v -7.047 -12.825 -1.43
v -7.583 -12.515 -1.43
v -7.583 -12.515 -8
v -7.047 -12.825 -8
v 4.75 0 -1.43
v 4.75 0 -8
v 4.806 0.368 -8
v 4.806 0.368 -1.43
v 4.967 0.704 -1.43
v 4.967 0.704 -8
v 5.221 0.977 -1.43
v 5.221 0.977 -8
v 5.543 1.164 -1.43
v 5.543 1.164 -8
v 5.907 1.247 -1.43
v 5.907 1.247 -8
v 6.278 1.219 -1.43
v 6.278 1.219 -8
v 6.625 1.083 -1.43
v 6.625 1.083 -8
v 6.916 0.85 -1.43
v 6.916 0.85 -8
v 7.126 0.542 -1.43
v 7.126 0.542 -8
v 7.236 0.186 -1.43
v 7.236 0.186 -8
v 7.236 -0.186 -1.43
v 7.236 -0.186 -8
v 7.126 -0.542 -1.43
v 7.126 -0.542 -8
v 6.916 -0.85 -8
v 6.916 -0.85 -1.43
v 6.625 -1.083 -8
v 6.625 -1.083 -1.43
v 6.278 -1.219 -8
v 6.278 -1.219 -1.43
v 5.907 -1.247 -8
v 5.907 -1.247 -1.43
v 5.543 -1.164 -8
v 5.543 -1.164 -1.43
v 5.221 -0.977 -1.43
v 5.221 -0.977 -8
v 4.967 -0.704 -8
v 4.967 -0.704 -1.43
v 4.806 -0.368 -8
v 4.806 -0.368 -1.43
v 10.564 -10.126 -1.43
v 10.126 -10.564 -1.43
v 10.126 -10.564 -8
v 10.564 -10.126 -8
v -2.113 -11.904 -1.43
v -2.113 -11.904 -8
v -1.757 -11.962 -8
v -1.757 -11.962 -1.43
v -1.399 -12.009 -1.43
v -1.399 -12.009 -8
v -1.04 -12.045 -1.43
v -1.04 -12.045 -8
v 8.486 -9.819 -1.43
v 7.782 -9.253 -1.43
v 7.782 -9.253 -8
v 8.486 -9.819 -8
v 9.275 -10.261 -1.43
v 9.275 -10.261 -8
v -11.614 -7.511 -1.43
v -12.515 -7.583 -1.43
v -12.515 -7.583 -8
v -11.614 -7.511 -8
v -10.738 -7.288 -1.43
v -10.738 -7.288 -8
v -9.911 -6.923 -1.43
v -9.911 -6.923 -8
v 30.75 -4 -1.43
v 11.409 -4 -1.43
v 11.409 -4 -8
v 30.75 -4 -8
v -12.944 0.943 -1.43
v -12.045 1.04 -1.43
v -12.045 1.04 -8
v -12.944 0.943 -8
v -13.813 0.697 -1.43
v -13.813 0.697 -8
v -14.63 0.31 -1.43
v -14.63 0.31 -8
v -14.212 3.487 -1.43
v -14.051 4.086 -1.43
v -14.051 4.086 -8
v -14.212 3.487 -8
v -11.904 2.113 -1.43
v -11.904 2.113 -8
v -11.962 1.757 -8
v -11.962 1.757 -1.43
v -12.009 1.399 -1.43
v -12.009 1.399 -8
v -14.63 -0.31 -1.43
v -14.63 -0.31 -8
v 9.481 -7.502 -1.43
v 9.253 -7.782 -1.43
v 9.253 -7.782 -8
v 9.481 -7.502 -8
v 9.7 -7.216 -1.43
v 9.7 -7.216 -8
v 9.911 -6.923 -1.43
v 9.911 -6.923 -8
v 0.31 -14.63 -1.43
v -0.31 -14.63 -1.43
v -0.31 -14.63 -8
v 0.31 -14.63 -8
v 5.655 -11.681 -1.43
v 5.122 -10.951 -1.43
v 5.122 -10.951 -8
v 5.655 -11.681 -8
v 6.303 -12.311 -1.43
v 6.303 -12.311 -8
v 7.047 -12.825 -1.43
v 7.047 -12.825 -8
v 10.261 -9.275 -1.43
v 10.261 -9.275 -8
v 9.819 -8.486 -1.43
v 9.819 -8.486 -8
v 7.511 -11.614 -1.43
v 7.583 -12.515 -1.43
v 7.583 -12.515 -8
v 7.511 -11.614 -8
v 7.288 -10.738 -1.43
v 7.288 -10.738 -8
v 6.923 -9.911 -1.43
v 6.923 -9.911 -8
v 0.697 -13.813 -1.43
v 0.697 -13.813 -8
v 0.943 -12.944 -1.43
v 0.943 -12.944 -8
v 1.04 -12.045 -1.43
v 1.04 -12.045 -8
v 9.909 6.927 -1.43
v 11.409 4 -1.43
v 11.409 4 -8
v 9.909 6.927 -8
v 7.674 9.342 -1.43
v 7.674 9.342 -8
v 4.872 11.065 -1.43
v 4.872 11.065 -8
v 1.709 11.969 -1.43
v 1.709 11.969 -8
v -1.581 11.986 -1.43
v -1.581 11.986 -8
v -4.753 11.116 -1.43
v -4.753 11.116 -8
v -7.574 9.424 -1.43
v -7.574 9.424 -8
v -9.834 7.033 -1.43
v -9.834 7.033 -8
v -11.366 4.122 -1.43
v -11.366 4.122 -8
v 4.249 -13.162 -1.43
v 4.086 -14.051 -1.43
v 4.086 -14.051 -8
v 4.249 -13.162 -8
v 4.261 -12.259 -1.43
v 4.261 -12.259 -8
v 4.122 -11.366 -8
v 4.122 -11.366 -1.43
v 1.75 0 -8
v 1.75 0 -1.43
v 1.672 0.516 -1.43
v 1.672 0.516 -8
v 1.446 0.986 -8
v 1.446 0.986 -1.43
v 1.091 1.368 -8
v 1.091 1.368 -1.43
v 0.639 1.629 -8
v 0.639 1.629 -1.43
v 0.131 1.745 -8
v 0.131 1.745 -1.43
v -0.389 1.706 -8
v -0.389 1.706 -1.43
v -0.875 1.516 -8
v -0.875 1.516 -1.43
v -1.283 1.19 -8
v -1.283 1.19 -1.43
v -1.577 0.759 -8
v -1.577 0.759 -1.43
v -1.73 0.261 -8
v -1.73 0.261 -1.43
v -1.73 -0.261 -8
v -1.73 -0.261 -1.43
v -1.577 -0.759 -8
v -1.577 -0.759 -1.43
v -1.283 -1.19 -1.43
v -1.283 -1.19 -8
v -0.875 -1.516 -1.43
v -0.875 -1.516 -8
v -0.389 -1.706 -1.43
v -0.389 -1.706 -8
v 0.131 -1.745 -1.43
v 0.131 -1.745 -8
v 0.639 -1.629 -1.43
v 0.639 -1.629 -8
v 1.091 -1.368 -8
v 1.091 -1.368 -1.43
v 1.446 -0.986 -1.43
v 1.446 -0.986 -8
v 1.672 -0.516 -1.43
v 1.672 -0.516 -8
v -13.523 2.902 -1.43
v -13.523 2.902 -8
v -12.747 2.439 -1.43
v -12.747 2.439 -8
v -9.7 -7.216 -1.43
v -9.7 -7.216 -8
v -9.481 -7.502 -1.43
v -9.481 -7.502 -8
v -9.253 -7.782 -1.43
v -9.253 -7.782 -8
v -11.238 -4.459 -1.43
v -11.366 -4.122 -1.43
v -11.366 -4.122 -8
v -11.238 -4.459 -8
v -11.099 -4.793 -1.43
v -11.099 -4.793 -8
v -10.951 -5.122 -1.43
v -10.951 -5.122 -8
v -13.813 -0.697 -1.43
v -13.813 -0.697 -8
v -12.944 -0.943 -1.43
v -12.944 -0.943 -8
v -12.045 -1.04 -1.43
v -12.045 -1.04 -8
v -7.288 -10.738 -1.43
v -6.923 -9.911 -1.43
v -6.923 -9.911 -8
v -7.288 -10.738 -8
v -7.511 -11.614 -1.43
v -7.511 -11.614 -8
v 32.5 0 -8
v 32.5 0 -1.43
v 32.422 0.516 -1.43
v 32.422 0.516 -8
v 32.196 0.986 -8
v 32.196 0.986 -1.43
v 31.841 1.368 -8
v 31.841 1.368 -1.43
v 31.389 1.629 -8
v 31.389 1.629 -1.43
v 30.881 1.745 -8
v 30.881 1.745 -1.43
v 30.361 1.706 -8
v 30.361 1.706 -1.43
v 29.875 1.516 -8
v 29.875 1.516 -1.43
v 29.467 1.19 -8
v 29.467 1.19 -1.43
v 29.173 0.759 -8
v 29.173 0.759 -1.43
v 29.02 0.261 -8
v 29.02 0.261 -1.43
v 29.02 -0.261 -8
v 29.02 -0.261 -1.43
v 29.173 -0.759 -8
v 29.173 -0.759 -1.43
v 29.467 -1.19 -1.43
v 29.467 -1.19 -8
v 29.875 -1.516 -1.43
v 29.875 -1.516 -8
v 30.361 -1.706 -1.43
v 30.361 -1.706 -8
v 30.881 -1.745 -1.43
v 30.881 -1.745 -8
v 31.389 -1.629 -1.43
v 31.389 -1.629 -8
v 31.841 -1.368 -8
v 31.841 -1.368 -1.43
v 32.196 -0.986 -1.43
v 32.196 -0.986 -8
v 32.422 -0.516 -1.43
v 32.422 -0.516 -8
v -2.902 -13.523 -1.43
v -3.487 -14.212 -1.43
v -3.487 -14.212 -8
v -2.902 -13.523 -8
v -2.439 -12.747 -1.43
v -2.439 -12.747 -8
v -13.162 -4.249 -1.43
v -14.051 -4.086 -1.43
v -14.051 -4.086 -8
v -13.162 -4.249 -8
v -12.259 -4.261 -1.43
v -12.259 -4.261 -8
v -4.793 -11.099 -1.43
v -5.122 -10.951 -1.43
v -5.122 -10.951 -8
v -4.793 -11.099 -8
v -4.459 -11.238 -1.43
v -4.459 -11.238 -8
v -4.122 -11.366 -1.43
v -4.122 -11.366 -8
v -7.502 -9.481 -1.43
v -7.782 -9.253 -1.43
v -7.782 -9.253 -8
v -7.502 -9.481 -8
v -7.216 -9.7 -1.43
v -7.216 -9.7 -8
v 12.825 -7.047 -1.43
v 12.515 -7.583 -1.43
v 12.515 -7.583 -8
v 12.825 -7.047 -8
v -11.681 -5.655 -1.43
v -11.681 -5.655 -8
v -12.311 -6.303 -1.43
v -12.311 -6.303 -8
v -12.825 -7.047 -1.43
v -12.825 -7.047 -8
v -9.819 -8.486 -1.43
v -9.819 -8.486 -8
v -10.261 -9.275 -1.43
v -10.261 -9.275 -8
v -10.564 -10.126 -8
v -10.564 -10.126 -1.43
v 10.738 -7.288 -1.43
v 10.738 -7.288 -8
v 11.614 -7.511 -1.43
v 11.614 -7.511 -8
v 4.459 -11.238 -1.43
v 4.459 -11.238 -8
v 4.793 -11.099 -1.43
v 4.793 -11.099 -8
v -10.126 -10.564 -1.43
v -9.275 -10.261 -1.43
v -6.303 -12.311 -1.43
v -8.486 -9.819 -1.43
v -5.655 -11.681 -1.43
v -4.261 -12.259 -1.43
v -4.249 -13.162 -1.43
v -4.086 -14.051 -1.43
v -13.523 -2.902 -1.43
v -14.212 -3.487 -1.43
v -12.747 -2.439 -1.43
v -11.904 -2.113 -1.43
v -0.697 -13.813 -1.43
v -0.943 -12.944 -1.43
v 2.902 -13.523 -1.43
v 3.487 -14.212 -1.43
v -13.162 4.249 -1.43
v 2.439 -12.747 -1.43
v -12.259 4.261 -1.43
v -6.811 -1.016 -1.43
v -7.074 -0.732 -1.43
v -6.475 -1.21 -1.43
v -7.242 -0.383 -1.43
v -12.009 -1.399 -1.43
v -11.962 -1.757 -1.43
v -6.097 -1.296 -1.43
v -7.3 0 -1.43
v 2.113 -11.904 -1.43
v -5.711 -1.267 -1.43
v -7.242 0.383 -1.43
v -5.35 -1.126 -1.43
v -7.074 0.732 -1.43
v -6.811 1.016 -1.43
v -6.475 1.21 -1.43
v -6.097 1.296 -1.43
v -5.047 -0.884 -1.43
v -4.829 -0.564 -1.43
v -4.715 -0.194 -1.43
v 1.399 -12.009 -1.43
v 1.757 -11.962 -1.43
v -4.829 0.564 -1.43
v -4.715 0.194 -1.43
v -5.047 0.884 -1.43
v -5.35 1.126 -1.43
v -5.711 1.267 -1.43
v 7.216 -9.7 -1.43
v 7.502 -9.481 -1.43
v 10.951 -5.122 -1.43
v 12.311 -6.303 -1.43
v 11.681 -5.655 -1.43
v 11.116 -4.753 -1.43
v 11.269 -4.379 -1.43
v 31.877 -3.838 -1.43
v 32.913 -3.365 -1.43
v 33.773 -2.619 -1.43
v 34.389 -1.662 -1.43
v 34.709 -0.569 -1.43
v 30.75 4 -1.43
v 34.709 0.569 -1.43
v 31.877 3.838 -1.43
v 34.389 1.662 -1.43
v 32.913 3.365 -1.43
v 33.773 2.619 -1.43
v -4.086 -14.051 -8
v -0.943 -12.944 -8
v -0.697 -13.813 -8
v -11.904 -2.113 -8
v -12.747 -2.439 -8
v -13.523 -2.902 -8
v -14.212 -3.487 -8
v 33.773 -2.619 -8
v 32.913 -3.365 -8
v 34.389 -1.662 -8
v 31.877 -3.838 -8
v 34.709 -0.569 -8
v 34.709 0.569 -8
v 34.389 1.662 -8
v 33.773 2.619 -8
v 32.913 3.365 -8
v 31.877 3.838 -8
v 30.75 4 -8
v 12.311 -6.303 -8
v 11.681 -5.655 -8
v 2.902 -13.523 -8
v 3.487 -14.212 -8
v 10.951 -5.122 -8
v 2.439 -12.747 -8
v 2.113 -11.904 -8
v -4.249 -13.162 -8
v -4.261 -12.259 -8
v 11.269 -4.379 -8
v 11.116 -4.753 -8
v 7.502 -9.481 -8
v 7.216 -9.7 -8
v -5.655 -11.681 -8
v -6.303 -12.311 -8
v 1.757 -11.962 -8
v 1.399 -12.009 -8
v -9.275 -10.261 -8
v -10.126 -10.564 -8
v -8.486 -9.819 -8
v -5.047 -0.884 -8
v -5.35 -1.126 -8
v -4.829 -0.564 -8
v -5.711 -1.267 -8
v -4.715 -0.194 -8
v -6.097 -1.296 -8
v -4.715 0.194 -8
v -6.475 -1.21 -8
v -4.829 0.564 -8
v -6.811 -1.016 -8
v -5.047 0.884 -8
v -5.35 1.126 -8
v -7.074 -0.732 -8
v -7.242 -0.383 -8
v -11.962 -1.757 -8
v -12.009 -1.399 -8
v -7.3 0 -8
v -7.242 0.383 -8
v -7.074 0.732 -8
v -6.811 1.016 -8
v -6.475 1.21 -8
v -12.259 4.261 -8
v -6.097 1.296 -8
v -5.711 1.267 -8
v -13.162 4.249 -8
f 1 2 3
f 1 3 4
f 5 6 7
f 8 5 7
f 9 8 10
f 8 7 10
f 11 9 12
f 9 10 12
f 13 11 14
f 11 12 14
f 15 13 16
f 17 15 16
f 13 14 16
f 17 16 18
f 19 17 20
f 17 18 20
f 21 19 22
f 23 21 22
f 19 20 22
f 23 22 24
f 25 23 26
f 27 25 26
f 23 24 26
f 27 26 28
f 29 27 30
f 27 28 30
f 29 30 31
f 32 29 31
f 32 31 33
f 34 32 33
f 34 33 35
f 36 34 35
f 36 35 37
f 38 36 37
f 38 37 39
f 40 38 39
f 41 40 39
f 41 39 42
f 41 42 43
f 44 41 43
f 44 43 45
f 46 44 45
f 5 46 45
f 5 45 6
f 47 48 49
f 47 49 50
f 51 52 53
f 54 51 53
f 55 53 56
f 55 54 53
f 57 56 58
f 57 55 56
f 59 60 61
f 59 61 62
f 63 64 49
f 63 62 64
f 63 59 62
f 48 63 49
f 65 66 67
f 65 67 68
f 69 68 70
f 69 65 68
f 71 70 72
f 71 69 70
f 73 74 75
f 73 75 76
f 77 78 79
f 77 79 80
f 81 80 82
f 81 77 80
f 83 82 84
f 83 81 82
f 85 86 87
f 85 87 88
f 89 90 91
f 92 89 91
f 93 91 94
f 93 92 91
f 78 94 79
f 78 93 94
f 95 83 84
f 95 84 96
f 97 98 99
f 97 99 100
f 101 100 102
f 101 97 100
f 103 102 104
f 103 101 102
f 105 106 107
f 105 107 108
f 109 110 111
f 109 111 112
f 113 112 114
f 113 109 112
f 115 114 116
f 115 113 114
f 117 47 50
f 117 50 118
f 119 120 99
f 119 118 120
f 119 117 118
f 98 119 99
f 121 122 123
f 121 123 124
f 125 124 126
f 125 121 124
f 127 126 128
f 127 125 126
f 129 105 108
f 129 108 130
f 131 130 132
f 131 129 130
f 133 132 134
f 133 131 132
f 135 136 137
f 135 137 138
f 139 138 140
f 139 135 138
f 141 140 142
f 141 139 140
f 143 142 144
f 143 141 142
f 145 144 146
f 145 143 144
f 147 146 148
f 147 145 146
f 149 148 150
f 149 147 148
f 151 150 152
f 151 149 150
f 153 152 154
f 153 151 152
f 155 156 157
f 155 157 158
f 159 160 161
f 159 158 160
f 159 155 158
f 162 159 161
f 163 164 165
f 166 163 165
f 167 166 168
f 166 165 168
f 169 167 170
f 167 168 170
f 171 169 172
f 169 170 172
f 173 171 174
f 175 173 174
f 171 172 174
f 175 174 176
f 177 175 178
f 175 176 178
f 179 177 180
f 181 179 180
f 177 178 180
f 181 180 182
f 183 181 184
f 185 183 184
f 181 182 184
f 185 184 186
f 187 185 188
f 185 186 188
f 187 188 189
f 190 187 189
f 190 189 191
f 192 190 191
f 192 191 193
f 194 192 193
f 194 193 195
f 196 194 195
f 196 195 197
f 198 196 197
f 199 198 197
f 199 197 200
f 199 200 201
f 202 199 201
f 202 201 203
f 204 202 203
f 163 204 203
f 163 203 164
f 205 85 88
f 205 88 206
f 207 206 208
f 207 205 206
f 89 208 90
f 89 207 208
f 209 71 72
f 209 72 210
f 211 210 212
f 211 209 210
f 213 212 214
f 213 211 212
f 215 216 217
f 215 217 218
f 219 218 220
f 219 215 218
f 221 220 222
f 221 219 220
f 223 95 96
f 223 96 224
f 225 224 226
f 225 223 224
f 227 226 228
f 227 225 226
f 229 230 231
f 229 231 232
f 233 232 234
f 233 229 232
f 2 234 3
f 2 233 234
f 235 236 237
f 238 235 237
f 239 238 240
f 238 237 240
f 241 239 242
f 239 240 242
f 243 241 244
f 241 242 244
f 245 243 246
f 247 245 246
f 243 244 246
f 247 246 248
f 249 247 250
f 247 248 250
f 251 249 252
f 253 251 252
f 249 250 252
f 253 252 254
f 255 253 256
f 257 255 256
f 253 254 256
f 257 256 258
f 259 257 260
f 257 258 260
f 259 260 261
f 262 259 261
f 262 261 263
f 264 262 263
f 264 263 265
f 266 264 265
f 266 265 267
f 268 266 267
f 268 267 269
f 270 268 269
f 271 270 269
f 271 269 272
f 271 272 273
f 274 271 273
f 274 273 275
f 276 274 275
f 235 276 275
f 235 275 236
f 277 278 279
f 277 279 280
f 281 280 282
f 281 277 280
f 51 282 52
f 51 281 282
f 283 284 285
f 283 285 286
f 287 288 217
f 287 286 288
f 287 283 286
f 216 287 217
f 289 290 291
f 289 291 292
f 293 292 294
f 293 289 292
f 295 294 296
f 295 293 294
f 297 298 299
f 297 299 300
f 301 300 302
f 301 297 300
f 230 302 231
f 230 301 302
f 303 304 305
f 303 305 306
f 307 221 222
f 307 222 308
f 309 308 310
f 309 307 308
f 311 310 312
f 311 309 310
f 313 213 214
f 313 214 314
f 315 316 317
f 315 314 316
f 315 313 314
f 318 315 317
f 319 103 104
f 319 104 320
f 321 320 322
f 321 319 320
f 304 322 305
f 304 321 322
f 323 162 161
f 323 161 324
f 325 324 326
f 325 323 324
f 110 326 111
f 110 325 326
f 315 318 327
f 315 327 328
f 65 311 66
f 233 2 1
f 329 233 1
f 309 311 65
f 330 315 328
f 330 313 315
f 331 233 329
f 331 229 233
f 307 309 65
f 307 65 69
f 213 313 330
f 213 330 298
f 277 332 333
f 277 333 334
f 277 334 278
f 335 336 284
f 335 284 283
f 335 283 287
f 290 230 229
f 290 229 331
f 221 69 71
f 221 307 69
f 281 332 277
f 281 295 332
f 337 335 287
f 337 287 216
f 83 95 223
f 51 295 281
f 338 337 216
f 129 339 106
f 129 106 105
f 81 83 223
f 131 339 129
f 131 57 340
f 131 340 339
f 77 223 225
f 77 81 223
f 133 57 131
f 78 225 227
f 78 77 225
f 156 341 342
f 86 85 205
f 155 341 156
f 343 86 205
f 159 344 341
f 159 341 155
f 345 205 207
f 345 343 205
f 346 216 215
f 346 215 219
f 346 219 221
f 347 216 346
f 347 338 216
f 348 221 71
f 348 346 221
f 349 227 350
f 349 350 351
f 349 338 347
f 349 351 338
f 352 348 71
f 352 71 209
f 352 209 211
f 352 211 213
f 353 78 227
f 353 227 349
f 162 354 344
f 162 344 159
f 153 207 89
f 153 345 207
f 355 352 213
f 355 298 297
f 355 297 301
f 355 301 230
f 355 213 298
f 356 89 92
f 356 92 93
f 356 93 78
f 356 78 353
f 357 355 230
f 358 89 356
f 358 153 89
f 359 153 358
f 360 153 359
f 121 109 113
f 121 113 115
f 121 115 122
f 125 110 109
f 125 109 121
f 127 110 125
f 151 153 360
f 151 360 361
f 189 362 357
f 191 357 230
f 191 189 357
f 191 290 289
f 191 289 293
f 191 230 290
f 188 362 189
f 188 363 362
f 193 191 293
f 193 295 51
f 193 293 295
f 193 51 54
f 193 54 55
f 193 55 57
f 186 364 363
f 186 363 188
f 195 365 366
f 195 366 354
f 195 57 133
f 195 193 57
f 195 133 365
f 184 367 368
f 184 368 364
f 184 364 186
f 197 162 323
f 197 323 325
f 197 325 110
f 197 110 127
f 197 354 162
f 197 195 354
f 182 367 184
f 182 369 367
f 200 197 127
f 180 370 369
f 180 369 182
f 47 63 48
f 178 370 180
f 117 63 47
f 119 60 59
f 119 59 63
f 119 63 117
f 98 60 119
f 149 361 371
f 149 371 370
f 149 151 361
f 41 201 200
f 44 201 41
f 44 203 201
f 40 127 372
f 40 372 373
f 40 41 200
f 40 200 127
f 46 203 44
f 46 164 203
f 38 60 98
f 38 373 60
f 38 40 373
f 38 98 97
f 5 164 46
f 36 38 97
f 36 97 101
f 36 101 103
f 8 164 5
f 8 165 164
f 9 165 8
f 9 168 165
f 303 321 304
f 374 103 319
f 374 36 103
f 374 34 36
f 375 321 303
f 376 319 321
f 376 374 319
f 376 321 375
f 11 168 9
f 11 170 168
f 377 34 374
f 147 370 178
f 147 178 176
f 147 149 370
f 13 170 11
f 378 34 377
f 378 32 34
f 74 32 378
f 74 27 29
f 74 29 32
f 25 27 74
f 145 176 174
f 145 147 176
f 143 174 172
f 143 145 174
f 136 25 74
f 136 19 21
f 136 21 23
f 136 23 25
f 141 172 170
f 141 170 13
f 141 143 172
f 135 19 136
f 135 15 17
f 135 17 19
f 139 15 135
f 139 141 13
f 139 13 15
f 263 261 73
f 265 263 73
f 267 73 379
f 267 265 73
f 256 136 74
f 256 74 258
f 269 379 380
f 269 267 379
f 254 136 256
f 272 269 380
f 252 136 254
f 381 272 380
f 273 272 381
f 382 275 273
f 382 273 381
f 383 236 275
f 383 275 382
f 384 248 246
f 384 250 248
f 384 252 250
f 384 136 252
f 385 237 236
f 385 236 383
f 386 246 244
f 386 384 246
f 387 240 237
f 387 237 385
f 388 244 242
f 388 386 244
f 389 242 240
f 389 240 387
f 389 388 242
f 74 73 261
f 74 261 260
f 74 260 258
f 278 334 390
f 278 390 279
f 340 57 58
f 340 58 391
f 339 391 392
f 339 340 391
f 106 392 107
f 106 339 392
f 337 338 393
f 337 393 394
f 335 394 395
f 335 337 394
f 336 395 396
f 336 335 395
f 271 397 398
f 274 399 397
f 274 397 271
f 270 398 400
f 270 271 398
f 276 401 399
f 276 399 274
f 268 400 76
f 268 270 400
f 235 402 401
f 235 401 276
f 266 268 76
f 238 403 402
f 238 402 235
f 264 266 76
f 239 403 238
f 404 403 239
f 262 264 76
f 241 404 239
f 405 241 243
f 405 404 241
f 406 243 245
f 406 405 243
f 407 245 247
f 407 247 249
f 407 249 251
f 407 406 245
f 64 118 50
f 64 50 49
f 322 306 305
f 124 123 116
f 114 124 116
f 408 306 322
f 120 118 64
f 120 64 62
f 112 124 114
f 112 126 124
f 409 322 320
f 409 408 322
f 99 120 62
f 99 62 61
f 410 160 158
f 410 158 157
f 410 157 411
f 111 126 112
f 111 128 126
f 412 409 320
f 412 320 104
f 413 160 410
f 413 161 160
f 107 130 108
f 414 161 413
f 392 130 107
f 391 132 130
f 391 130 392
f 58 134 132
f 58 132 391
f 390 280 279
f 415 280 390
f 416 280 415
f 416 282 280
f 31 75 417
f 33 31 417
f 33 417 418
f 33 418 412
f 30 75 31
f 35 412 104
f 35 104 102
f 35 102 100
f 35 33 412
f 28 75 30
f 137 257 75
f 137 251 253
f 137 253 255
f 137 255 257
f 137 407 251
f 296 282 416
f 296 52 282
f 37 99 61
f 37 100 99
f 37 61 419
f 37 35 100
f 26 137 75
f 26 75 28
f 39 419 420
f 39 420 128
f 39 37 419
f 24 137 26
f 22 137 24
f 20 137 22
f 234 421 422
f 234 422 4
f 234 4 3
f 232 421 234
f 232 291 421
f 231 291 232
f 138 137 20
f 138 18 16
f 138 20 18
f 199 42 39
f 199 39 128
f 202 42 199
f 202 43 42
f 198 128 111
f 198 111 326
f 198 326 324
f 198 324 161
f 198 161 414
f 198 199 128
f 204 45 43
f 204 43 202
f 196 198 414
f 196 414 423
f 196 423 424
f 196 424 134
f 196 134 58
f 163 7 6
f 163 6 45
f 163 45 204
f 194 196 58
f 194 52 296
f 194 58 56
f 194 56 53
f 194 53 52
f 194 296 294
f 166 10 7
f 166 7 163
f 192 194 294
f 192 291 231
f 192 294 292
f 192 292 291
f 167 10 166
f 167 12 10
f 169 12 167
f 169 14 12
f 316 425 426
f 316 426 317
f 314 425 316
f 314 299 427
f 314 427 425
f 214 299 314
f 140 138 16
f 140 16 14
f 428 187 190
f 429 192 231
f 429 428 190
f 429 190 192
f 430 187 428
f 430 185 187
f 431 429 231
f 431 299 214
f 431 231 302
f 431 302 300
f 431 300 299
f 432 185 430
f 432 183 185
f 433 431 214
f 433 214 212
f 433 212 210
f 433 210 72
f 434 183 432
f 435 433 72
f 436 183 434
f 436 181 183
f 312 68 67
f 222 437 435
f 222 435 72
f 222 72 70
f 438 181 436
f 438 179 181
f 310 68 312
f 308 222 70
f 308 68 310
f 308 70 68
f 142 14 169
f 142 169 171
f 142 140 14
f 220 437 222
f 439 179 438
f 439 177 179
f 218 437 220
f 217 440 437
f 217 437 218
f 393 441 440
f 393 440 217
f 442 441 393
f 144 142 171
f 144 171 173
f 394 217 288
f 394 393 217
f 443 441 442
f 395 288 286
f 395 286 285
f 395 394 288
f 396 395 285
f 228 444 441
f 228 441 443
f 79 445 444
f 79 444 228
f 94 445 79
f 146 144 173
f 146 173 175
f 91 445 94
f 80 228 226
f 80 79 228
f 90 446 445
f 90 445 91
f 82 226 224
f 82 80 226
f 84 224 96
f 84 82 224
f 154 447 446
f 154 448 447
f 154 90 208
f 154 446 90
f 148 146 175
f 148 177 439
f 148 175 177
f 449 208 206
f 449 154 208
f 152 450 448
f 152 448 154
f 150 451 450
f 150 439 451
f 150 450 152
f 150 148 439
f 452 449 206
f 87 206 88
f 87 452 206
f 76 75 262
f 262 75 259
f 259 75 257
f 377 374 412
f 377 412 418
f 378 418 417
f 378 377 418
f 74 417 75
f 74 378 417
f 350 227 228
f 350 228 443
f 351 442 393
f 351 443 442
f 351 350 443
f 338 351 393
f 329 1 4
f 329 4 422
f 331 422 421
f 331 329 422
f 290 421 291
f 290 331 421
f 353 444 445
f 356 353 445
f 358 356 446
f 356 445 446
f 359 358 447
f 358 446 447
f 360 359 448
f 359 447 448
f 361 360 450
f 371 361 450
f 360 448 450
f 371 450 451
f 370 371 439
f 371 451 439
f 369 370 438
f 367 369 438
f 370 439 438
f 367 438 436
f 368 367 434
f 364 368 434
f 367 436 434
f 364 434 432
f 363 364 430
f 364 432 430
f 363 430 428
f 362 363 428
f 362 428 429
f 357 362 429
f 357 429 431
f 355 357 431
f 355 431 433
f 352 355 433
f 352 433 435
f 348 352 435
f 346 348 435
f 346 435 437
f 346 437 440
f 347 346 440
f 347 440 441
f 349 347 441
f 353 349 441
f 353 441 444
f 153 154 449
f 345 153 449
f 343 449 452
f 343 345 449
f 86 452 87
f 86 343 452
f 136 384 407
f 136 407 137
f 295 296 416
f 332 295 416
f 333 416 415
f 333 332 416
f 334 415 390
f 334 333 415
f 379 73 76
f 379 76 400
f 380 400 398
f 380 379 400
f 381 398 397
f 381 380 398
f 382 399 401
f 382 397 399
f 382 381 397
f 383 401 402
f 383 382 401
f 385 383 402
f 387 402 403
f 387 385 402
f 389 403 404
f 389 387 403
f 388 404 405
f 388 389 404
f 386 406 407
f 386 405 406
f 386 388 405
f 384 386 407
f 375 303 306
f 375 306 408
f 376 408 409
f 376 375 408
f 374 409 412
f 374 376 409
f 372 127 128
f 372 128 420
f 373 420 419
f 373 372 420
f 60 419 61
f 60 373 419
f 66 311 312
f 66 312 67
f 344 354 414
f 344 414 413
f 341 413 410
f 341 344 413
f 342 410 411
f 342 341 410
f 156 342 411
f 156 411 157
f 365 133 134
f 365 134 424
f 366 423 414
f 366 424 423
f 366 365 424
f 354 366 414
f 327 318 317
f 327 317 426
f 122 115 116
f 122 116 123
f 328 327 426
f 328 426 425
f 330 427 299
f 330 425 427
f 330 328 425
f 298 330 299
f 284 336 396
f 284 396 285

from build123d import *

# Parameters (mm, degrees)
SKETCH2_R           = 1.75
BOSS_EXTRUDE1_DEPTH = 12
SKETCH10_R          = 1.3
SKETCH10_R_2        = 1.25
CUT_EXTRUDE1_DEPTH  = 40.567655983
CUT_EXTRUDE2_START  = -4
CUT_EXTRUDE2_DEPTH  = 4
CUT_EXTRUDE3_DEPTH  = 0.57
CUT_EXTRUDE4_DEPTH  = 0.86


with BuildPart() as part:
    # Sketch2 → Boss-Extrude1 (new body)
    with BuildSketch(Plane.XY):
        with BuildLine():
            ThreePointArc((-11.365584201, 4.122086336), (-12.71070456, 4.273667417), (-14.051260935, 4.085959636))
            Line((-14.051260935, 4.085959636), (-14.211728743, 3.487085624))
            ThreePointArc((-14.211728743, 3.487085624), (-13.144626757, 2.65424773), (-11.903927815, 2.112960617))
            ThreePointArc((-11.903927815, 2.112960617), (-11.986568374, 1.578061664), (-12.04518576, 1.04))
            ThreePointArc((-12.04518576, 1.04), (-13.383704325, 0.838273314), (-14.63, 0.31))
            Line((-14.63, 0.31), (-14.63, -0.31))
            ThreePointArc((-14.63, -0.31), (-13.383704325, -0.838273314), (-12.04518576, -1.04))
            ThreePointArc((-12.04518576, -1.04), (-11.986568374, -1.578061664), (-11.903927815, -2.112960617))
            ThreePointArc((-11.903927815, -2.112960617), (-13.144626757, -2.65424773), (-14.211728743, -3.487085624))
            Line((-14.211728743, -3.487085624), (-14.051260935, -4.085959636))
            ThreePointArc((-14.051260935, -4.085959636), (-12.71070456, -4.273667417), (-11.365584201, -4.122086336))
            ThreePointArc((-11.365584201, -4.122086336), (-11.169703548, -4.626642697), (-10.951436862, -5.12192646))
            ThreePointArc((-10.951436862, -5.12192646), (-12.009764599, -5.965886177), (-12.824951657, -7.046532125))
            Line((-12.824951657, -7.046532125), (-12.514951657, -7.583467875))
            ThreePointArc((-12.514951657, -7.583467875), (-11.171491285, -7.417818147), (-9.911436862, -6.9232593))
            ThreePointArc((-9.911436862, -6.9232593), (-9.591641884, -7.359925677), (-9.252623584, -7.781841479))
            ThreePointArc((-9.252623584, -7.781841479), (-10.05645683, -8.870959341), (-10.564175311, -10.125769107))
            Line((-10.564175311, -10.125769107), (-10.125769107, -10.564175311))
            ThreePointArc((-10.125769107, -10.564175311), (-8.870959341, -10.05645683), (-7.781841479, -9.252623584))
            ThreePointArc((-7.781841479, -9.252623584), (-7.359925677, -9.591641884), (-6.9232593, -9.911436862))
            ThreePointArc((-6.9232593, -9.911436862), (-7.417818147, -11.171491285), (-7.583467875, -12.514951657))
            Line((-7.583467875, -12.514951657), (-7.046532125, -12.824951657))
            ThreePointArc((-7.046532125, -12.824951657), (-5.965886177, -12.009764599), (-5.12192646, -10.951436862))
            ThreePointArc((-5.12192646, -10.951436862), (-4.626642697, -11.169703548), (-4.122086336, -11.365584201))
            ThreePointArc((-4.122086336, -11.365584201), (-4.273667417, -12.71070456), (-4.085959636, -14.051260935))
            Line((-4.085959636, -14.051260935), (-3.487085624, -14.211728743))
            ThreePointArc((-3.487085624, -14.211728743), (-2.65424773, -13.144626757), (-2.112960617, -11.903927815))
            ThreePointArc((-2.112960617, -11.903927815), (-1.578061664, -11.986568374), (-1.04, -12.04518576))
            ThreePointArc((-1.04, -12.04518576), (-0.838273314, -13.383704325), (-0.31, -14.63))
            Line((-0.31, -14.63), (0.31, -14.63))
            ThreePointArc((0.31, -14.63), (0.838273314, -13.383704325), (1.04, -12.04518576))
            ThreePointArc((1.04, -12.04518576), (1.578061664, -11.986568374), (2.112960617, -11.903927815))
            ThreePointArc((2.112960617, -11.903927815), (2.65424773, -13.144626757), (3.487085624, -14.211728743))
            Line((3.487085624, -14.211728743), (4.085959636, -14.051260935))
            ThreePointArc((4.085959636, -14.051260935), (4.273667417, -12.71070456), (4.122086336, -11.365584201))
            ThreePointArc((4.122086336, -11.365584201), (4.626642697, -11.169703548), (5.12192646, -10.951436862))
            ThreePointArc((5.12192646, -10.951436862), (5.965886177, -12.009764599), (7.046532125, -12.824951657))
            Line((7.046532125, -12.824951657), (7.583467875, -12.514951657))
            ThreePointArc((7.583467875, -12.514951657), (7.417818147, -11.171491285), (6.9232593, -9.911436862))
            ThreePointArc((6.9232593, -9.911436862), (7.359925677, -9.591641884), (7.781841479, -9.252623584))
            ThreePointArc((7.781841479, -9.252623584), (8.870959341, -10.05645683), (10.125769107, -10.564175311))
            Line((10.125769107, -10.564175311), (10.564175311, -10.125769107))
            ThreePointArc((10.564175311, -10.125769107), (10.05645683, -8.870959341), (9.252623584, -7.781841479))
            ThreePointArc((9.252623584, -7.781841479), (9.591641884, -7.359925677), (9.911436862, -6.9232593))
            ThreePointArc((9.911436862, -6.9232593), (11.171491285, -7.417818147), (12.514951657, -7.583467875))
            Line((12.514951657, -7.583467875), (12.824951657, -7.046532125))
            ThreePointArc((12.824951657, -7.046532125), (12.009764599, -5.965886177), (10.951436862, -5.12192646))
            ThreePointArc((10.951436862, -5.12192646), (11.194344337, -4.566700654), (11.409123542, -4))
            Line((11.409123542, -4), (30.75, -4))
            ThreePointArc((30.75, -4), (34.75, 0), (30.75, 4))
            Line((30.75, 4), (11.409123542, 4))
            ThreePointArc((11.409123542, 4), (0.064808849, 12.089826294), (-11.365584201, 4.122086336))
        make_face()
        Circle(SKETCH2_R, mode=Mode.SUBTRACT)
        with Locations((30.75, 0)):
            Circle(SKETCH2_R, mode=Mode.SUBTRACT)
    extrude(amount=-BOSS_EXTRUDE1_DEPTH)

    # Sketch10 → Cut-Extrude1 (cut, through all)
    with BuildSketch(Plane(origin=(0, 0, -12), x_dir=(-1, 0, 0), z_dir=(0, 0, -1))):
        with Locations((6, 0)):
            Circle(SKETCH10_R)
        with Locations((-6, 0)):
            Circle(SKETCH10_R_2)
    extrude(amount=-CUT_EXTRUDE1_DEPTH, mode=Mode.SUBTRACT)

    # Sketch11 → Cut-Extrude2 (cut)
    with BuildSketch(Plane(origin=(0, 0, -12), x_dir=(-1, 0, 0), z_dir=(0, 0, -1)).offset(CUT_EXTRUDE2_START)):
        with BuildLine():
            Line((-11.409123542, 4), (-30.75, 4))
            ThreePointArc((-30.75, 4), (-34.75, 0), (-30.75, -4))
            Line((-30.75, -4), (-11.409123542, -4))
            ThreePointArc((-11.409123542, -4), (-11.194344337, -4.566700654), (-10.951436862, -5.12192646))
            ThreePointArc((-10.951436862, -5.12192646), (-12.009764599, -5.965886177), (-12.824951657, -7.046532125))
            Line((-12.824951657, -7.046532125), (-12.514951657, -7.583467875))
            ThreePointArc((-12.514951657, -7.583467875), (-11.171491285, -7.417818147), (-9.911436862, -6.9232593))
            ThreePointArc((-9.911436862, -6.9232593), (-9.591641884, -7.359925677), (-9.252623584, -7.781841479))
            ThreePointArc((-9.252623584, -7.781841479), (-10.05645683, -8.870959341), (-10.564175311, -10.125769107))
            Line((-10.564175311, -10.125769107), (-10.125769107, -10.564175311))
            ThreePointArc((-10.125769107, -10.564175311), (-8.870959341, -10.05645683), (-7.781841479, -9.252623584))
            ThreePointArc((-7.781841479, -9.252623584), (-7.359925677, -9.591641884), (-6.9232593, -9.911436862))
            ThreePointArc((-6.9232593, -9.911436862), (-7.417818147, -11.171491285), (-7.583467875, -12.514951657))
            Line((-7.583467875, -12.514951657), (-7.046532125, -12.824951657))
            ThreePointArc((-7.046532125, -12.824951657), (-5.965886177, -12.009764599), (-5.12192646, -10.951436862))
            ThreePointArc((-5.12192646, -10.951436862), (-4.626642697, -11.169703548), (-4.122086336, -11.365584201))
            ThreePointArc((-4.122086336, -11.365584201), (-4.273667417, -12.71070456), (-4.085959636, -14.051260935))
            Line((-4.085959636, -14.051260935), (-3.487085624, -14.211728743))
            ThreePointArc((-3.487085624, -14.211728743), (-2.65424773, -13.144626757), (-2.112960617, -11.903927815))
            ThreePointArc((-2.112960617, -11.903927815), (-1.578061664, -11.986568374), (-1.04, -12.04518576))
            ThreePointArc((-1.04, -12.04518576), (-0.838273314, -13.383704325), (-0.31, -14.63))
            Line((-0.31, -14.63), (0.31, -14.63))
            ThreePointArc((0.31, -14.63), (0.838273314, -13.383704325), (1.04, -12.04518576))
            ThreePointArc((1.04, -12.04518576), (1.578061664, -11.986568374), (2.112960617, -11.903927815))
            ThreePointArc((2.112960617, -11.903927815), (2.65424773, -13.144626757), (3.487085624, -14.211728743))
            Line((3.487085624, -14.211728743), (4.085959636, -14.051260935))
            ThreePointArc((4.085959636, -14.051260935), (4.273667417, -12.71070456), (4.122086336, -11.365584201))
            ThreePointArc((4.122086336, -11.365584201), (4.626642697, -11.169703548), (5.12192646, -10.951436862))
            ThreePointArc((5.12192646, -10.951436862), (5.965886177, -12.009764599), (7.046532125, -12.824951657))
            Line((7.046532125, -12.824951657), (7.583467875, -12.514951657))
            ThreePointArc((7.583467875, -12.514951657), (7.417818147, -11.171491285), (6.9232593, -9.911436862))
            ThreePointArc((6.9232593, -9.911436862), (7.359925677, -9.591641884), (7.781841479, -9.252623584))
            ThreePointArc((7.781841479, -9.252623584), (8.870959341, -10.05645683), (10.125769107, -10.564175311))
            Line((10.125769107, -10.564175311), (10.564175311, -10.125769107))
            ThreePointArc((10.564175311, -10.125769107), (10.05645683, -8.870959341), (9.252623584, -7.781841479))
            ThreePointArc((9.252623584, -7.781841479), (9.591641884, -7.359925677), (9.911436862, -6.9232593))
            ThreePointArc((9.911436862, -6.9232593), (11.171491285, -7.417818147), (12.514951657, -7.583467875))
            Line((12.514951657, -7.583467875), (12.824951657, -7.046532125))
            ThreePointArc((12.824951657, -7.046532125), (12.009764599, -5.965886177), (10.951436862, -5.12192646))
            ThreePointArc((10.951436862, -5.12192646), (11.169703548, -4.626642697), (11.365584201, -4.122086336))
            ThreePointArc((11.365584201, -4.122086336), (12.71070456, -4.273667417), (14.051260935, -4.085959636))
            Line((14.051260935, -4.085959636), (14.211728743, -3.487085624))
            ThreePointArc((14.211728743, -3.487085624), (13.144626757, -2.65424773), (11.903927815, -2.112960617))
            ThreePointArc((11.903927815, -2.112960617), (11.986568374, -1.578061664), (12.04518576, -1.04))
            ThreePointArc((12.04518576, -1.04), (13.383704325, -0.838273314), (14.63, -0.31))
            Line((14.63, -0.31), (14.63, 0.31))
            ThreePointArc((14.63, 0.31), (13.383704325, 0.838273314), (12.04518576, 1.04))
            ThreePointArc((12.04518576, 1.04), (11.986568374, 1.578061664), (11.903927815, 2.112960617))
            ThreePointArc((11.903927815, 2.112960617), (13.144626757, 2.65424773), (14.211728743, 3.487085624))
            Line((14.211728743, 3.487085624), (14.051260935, 4.085959636))
            ThreePointArc((14.051260935, 4.085959636), (12.71070456, 4.273667417), (11.365584201, 4.122086336))
            ThreePointArc((11.365584201, 4.122086336), (-0.064808849, 12.089826294), (-11.409123542, 4))
        make_face()
    extrude(amount=CUT_EXTRUDE2_DEPTH, mode=Mode.SUBTRACT)

    # Sketch12 → Cut-Extrude3 (cut)
    with BuildSketch(Plane.XY):
        with BuildLine():
            Line((30.75, 4), (11.409123542, 4))
            ThreePointArc((11.409123542, 4), (0.064808849, 12.089826294), (-11.365584201, 4.122086336))
            ThreePointArc((-11.365584201, 4.122086336), (-12.71070456, 4.273667417), (-14.051260935, 4.085959636))
            Line((-14.051260935, 4.085959636), (-14.211728743, 3.487085624))
            ThreePointArc((-14.211728743, 3.487085624), (-13.144626757, 2.65424773), (-11.903927815, 2.112960617))
            ThreePointArc((-11.903927815, 2.112960617), (-11.986568374, 1.578061664), (-12.04518576, 1.04))
            ThreePointArc((-12.04518576, 1.04), (-13.383704325, 0.838273314), (-14.63, 0.31))
            Line((-14.63, 0.31), (-14.63, -0.31))
            ThreePointArc((-14.63, -0.31), (-13.383704325, -0.838273314), (-12.04518576, -1.04))
            ThreePointArc((-12.04518576, -1.04), (-11.986568374, -1.578061664), (-11.903927815, -2.112960617))
            ThreePointArc((-11.903927815, -2.112960617), (-13.144626757, -2.65424773), (-14.211728743, -3.487085624))
            Line((-14.211728743, -3.487085624), (-14.051260935, -4.085959636))
            ThreePointArc((-14.051260935, -4.085959636), (-12.71070456, -4.273667417), (-11.365584201, -4.122086336))
            ThreePointArc((-11.365584201, -4.122086336), (-11.169703548, -4.626642697), (-10.951436862, -5.12192646))
            ThreePointArc((-10.951436862, -5.12192646), (-12.009764599, -5.965886177), (-12.824951657, -7.046532125))
            Line((-12.824951657, -7.046532125), (-12.514951657, -7.583467875))
            ThreePointArc((-12.514951657, -7.583467875), (-11.171491285, -7.417818147), (-9.911436862, -6.9232593))
            ThreePointArc((-9.911436862, -6.9232593), (-9.591641884, -7.359925677), (-9.252623584, -7.781841479))
            ThreePointArc((-9.252623584, -7.781841479), (-10.05645683, -8.870959341), (-10.564175311, -10.125769107))
            Line((-10.564175311, -10.125769107), (-10.125769107, -10.564175311))
            ThreePointArc((-10.125769107, -10.564175311), (-8.870959341, -10.05645683), (-7.781841479, -9.252623584))
            ThreePointArc((-7.781841479, -9.252623584), (-7.359925677, -9.591641884), (-6.9232593, -9.911436862))
            ThreePointArc((-6.9232593, -9.911436862), (-7.417818147, -11.171491285), (-7.583467875, -12.514951657))
            Line((-7.583467875, -12.514951657), (-7.046532125, -12.824951657))
            ThreePointArc((-7.046532125, -12.824951657), (-5.965886177, -12.009764599), (-5.12192646, -10.951436862))
            ThreePointArc((-5.12192646, -10.951436862), (-4.626642697, -11.169703548), (-4.122086336, -11.365584201))
            ThreePointArc((-4.122086336, -11.365584201), (-4.273667417, -12.71070456), (-4.085959636, -14.051260935))
            Line((-4.085959636, -14.051260935), (-3.487085624, -14.211728743))
            ThreePointArc((-3.487085624, -14.211728743), (-2.65424773, -13.144626757), (-2.112960617, -11.903927815))
            ThreePointArc((-2.112960617, -11.903927815), (-1.578061664, -11.986568374), (-1.04, -12.04518576))
            ThreePointArc((-1.04, -12.04518576), (-0.838273314, -13.383704325), (-0.31, -14.63))
            Line((-0.31, -14.63), (0.31, -14.63))
            ThreePointArc((0.31, -14.63), (0.838273314, -13.383704325), (1.04, -12.04518576))
            ThreePointArc((1.04, -12.04518576), (1.578061664, -11.986568374), (2.112960617, -11.903927815))
            ThreePointArc((2.112960617, -11.903927815), (2.65424773, -13.144626757), (3.487085624, -14.211728743))
            Line((3.487085624, -14.211728743), (4.085959636, -14.051260935))
            ThreePointArc((4.085959636, -14.051260935), (4.273667417, -12.71070456), (4.122086336, -11.365584201))
            ThreePointArc((4.122086336, -11.365584201), (4.626642697, -11.169703548), (5.12192646, -10.951436862))
            ThreePointArc((5.12192646, -10.951436862), (5.965886177, -12.009764599), (7.046532125, -12.824951657))
            Line((7.046532125, -12.824951657), (7.583467875, -12.514951657))
            ThreePointArc((7.583467875, -12.514951657), (7.417818147, -11.171491285), (6.9232593, -9.911436862))
            ThreePointArc((6.9232593, -9.911436862), (7.359925677, -9.591641884), (7.781841479, -9.252623584))
            ThreePointArc((7.781841479, -9.252623584), (8.870959341, -10.05645683), (10.125769107, -10.564175311))
            Line((10.125769107, -10.564175311), (10.564175311, -10.125769107))
            ThreePointArc((10.564175311, -10.125769107), (10.05645683, -8.870959341), (9.252623584, -7.781841479))
            ThreePointArc((9.252623584, -7.781841479), (9.591641884, -7.359925677), (9.911436862, -6.9232593))
            ThreePointArc((9.911436862, -6.9232593), (11.171491285, -7.417818147), (12.514951657, -7.583467875))
            Line((12.514951657, -7.583467875), (12.824951657, -7.046532125))
            ThreePointArc((12.824951657, -7.046532125), (12.009764599, -5.965886177), (10.951436862, -5.12192646))
            ThreePointArc((10.951436862, -5.12192646), (11.194344337, -4.566700654), (11.409123542, -4))
            Line((11.409123542, -4), (30.75, -4))
            ThreePointArc((30.75, -4), (34.75, 0), (30.75, 4))
        make_face()
    extrude(amount=-CUT_EXTRUDE3_DEPTH, mode=Mode.SUBTRACT)

    # Sketch16 → Cut-Extrude4 (cut)
    with BuildSketch(Plane.XY.offset(-0.57)):
        with BuildLine():
            Line((11.409123542, -4), (30.75, -4))
            ThreePointArc((30.75, -4), (34.75, 0), (30.75, 4))
            Line((30.75, 4), (11.409123542, 4))
            ThreePointArc((11.409123542, 4), (0.064808849, 12.089826294), (-11.365584201, 4.122086336))
            ThreePointArc((-11.365584201, 4.122086336), (-12.71070456, 4.273667417), (-14.051260935, 4.085959636))
            Line((-14.051260935, 4.085959636), (-14.211728743, 3.487085624))
            ThreePointArc((-14.211728743, 3.487085624), (-13.144626757, 2.65424773), (-11.903927815, 2.112960617))
            ThreePointArc((-11.903927815, 2.112960617), (-11.986568374, 1.578061664), (-12.04518576, 1.04))
            ThreePointArc((-12.04518576, 1.04), (-13.383704325, 0.838273314), (-14.63, 0.31))
            Line((-14.63, 0.31), (-14.63, -0.31))
            ThreePointArc((-14.63, -0.31), (-13.383704325, -0.838273314), (-12.04518576, -1.04))
            ThreePointArc((-12.04518576, -1.04), (-11.986568374, -1.578061664), (-11.903927815, -2.112960617))
            ThreePointArc((-11.903927815, -2.112960617), (-13.144626757, -2.65424773), (-14.211728743, -3.487085624))
            Line((-14.211728743, -3.487085624), (-14.051260935, -4.085959636))
            ThreePointArc((-14.051260935, -4.085959636), (-12.71070456, -4.273667417), (-11.365584201, -4.122086336))
            ThreePointArc((-11.365584201, -4.122086336), (-11.169703548, -4.626642697), (-10.951436862, -5.12192646))
            ThreePointArc((-10.951436862, -5.12192646), (-12.009764599, -5.965886177), (-12.824951657, -7.046532125))
            Line((-12.824951657, -7.046532125), (-12.514951657, -7.583467875))
            ThreePointArc((-12.514951657, -7.583467875), (-11.171491285, -7.417818147), (-9.911436862, -6.9232593))
            ThreePointArc((-9.911436862, -6.9232593), (-9.591641884, -7.359925677), (-9.252623584, -7.781841479))
            ThreePointArc((-9.252623584, -7.781841479), (-10.05645683, -8.870959341), (-10.564175311, -10.125769107))
            Line((-10.564175311, -10.125769107), (-10.125769107, -10.564175311))
            ThreePointArc((-10.125769107, -10.564175311), (-8.870959341, -10.05645683), (-7.781841479, -9.252623584))
            ThreePointArc((-7.781841479, -9.252623584), (-7.359925677, -9.591641884), (-6.9232593, -9.911436862))
            ThreePointArc((-6.9232593, -9.911436862), (-7.417818147, -11.171491285), (-7.583467875, -12.514951657))
            Line((-7.583467875, -12.514951657), (-7.046532125, -12.824951657))
            ThreePointArc((-7.046532125, -12.824951657), (-5.965886177, -12.009764599), (-5.12192646, -10.951436862))
            ThreePointArc((-5.12192646, -10.951436862), (-4.626642697, -11.169703548), (-4.122086336, -11.365584201))
            ThreePointArc((-4.122086336, -11.365584201), (-4.273667417, -12.71070456), (-4.085959636, -14.051260935))
            Line((-4.085959636, -14.051260935), (-3.487085624, -14.211728743))
            ThreePointArc((-3.487085624, -14.211728743), (-2.65424773, -13.144626757), (-2.112960617, -11.903927815))
            ThreePointArc((-2.112960617, -11.903927815), (-1.578061664, -11.986568374), (-1.04, -12.04518576))
            ThreePointArc((-1.04, -12.04518576), (-0.838273314, -13.383704325), (-0.31, -14.63))
            Line((-0.31, -14.63), (0.31, -14.63))
            ThreePointArc((0.31, -14.63), (0.838273314, -13.383704325), (1.04, -12.04518576))
            ThreePointArc((1.04, -12.04518576), (1.578061664, -11.986568374), (2.112960617, -11.903927815))
            ThreePointArc((2.112960617, -11.903927815), (2.65424773, -13.144626757), (3.487085624, -14.211728743))
            Line((3.487085624, -14.211728743), (4.085959636, -14.051260935))
            ThreePointArc((4.085959636, -14.051260935), (4.273667417, -12.71070456), (4.122086336, -11.365584201))
            ThreePointArc((4.122086336, -11.365584201), (4.626642697, -11.169703548), (5.12192646, -10.951436862))
            ThreePointArc((5.12192646, -10.951436862), (5.965886177, -12.009764599), (7.046532125, -12.824951657))
            Line((7.046532125, -12.824951657), (7.583467875, -12.514951657))
            ThreePointArc((7.583467875, -12.514951657), (7.417818147, -11.171491285), (6.9232593, -9.911436862))
            ThreePointArc((6.9232593, -9.911436862), (7.359925677, -9.591641884), (7.781841479, -9.252623584))
            ThreePointArc((7.781841479, -9.252623584), (8.870959341, -10.05645683), (10.125769107, -10.564175311))
            Line((10.125769107, -10.564175311), (10.564175311, -10.125769107))
            ThreePointArc((10.564175311, -10.125769107), (10.05645683, -8.870959341), (9.252623584, -7.781841479))
            ThreePointArc((9.252623584, -7.781841479), (9.591641884, -7.359925677), (9.911436862, -6.9232593))
            ThreePointArc((9.911436862, -6.9232593), (11.171491285, -7.417818147), (12.514951657, -7.583467875))
            Line((12.514951657, -7.583467875), (12.824951657, -7.046532125))
            ThreePointArc((12.824951657, -7.046532125), (12.009764599, -5.965886177), (10.951436862, -5.12192646))
            ThreePointArc((10.951436862, -5.12192646), (11.194344337, -4.566700654), (11.409123542, -4))
        make_face()
    extrude(amount=-CUT_EXTRUDE4_DEPTH, mode=Mode.SUBTRACT)


solid = part.part
